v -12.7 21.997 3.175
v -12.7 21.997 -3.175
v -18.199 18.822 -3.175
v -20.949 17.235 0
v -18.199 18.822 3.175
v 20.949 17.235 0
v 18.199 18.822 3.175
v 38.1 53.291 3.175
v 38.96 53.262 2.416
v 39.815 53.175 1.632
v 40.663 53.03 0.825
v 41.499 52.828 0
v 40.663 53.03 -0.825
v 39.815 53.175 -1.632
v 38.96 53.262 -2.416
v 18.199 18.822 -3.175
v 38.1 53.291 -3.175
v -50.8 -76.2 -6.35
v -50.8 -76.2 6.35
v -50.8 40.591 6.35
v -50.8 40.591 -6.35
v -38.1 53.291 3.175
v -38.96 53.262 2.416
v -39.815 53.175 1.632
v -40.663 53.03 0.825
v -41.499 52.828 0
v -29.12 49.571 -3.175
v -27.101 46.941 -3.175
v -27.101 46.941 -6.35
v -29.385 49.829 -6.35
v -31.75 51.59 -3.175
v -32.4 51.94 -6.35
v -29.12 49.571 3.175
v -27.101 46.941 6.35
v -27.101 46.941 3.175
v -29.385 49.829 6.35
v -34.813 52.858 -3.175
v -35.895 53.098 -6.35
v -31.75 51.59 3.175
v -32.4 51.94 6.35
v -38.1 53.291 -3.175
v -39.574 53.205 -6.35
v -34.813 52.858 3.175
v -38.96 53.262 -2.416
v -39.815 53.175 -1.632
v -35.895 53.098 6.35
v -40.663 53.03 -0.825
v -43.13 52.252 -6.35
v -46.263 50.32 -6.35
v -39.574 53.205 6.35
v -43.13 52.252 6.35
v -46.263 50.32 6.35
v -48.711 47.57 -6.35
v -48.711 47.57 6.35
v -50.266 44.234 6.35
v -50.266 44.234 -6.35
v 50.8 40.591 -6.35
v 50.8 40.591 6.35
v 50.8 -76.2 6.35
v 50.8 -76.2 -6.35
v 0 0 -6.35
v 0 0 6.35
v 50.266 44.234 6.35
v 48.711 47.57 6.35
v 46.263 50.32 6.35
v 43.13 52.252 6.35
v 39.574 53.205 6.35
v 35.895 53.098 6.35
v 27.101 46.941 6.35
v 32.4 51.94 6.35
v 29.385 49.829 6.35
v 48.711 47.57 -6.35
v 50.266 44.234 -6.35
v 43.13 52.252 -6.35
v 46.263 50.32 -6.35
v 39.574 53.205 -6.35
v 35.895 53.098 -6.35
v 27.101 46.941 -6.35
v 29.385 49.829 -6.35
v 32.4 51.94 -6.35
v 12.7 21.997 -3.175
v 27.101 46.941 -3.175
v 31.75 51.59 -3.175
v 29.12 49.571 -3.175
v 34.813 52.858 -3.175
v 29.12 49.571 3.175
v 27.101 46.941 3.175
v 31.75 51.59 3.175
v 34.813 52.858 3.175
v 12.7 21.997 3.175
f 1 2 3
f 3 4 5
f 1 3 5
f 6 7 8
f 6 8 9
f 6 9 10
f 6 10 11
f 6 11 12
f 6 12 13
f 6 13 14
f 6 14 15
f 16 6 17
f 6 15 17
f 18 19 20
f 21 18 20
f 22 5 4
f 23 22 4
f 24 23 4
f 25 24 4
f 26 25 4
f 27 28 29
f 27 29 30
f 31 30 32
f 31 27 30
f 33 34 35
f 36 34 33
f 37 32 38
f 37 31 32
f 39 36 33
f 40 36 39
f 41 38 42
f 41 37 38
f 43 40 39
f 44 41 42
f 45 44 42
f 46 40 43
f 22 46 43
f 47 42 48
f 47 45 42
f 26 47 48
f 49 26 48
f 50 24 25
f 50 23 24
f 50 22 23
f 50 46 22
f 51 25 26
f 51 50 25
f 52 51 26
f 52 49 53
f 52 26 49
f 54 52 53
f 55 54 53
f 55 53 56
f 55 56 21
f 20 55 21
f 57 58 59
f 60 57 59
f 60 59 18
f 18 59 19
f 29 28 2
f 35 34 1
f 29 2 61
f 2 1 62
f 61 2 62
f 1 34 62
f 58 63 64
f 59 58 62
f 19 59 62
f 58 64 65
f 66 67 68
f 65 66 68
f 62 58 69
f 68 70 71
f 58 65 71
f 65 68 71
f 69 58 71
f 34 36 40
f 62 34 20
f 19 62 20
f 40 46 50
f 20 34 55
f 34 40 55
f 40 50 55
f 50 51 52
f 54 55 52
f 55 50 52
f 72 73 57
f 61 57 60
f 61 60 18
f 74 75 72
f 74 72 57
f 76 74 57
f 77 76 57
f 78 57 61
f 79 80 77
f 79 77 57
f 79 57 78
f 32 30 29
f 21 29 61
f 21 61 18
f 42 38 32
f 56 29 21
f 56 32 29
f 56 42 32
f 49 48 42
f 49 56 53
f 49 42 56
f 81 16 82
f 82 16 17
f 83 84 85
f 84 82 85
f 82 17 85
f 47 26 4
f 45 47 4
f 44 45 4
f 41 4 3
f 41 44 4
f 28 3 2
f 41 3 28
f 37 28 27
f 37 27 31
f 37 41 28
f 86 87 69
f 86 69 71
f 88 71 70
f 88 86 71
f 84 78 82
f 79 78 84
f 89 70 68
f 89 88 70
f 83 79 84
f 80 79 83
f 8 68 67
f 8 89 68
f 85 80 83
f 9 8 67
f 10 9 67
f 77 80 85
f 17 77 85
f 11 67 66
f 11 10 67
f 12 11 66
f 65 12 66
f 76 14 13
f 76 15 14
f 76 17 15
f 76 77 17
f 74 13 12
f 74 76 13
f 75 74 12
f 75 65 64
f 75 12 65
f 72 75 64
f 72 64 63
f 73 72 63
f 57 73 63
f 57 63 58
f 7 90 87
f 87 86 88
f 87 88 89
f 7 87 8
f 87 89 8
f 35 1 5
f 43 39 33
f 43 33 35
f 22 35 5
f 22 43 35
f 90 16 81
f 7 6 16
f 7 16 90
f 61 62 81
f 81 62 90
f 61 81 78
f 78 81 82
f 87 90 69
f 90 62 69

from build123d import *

# Parameters (mm, degrees)
BOSS_EXTRUDE1_DEPTH = 6.35
CUT_EXTRUDE1_DEPTH  = 76.2
FILLET1_R           = 12.700000000000001


with BuildPart() as part:
    # Sketch1 → Boss-Extrude1 (new, symmetric)
    with BuildSketch(Plane.XY):
        Polygon((-50.8, 87.98818102450007), (0, 0), (50.79999999999998, 87.98818102450008), (50.800000000000004, -76.19999999999999), (-50.79999999999999, -76.20000000000002), align=None)
    extrude(amount=BOSS_EXTRUDE1_DEPTH, both=True)

    # Sketch2 → Cut-Extrude1 (cut)
    with BuildSketch(Plane(origin=(-50.80000000000058, 87.98818102449974, 0), x_dir=(0, 0, -1), z_dir=(-0.500000000000001, 0.866025403784438, 0))):
        Polygon((3.175000000000003, 0), (-3.1749999999999967, 0), (-3.1749999999999967, 6.35), (3.65e-15, 9.524999999999999), (3.1749999999999994, 6.35), align=None)
    cut_extrude1 = extrude(amount=-CUT_EXTRUDE1_DEPTH, mode=Mode.SUBTRACT)

    # Mirror5: Cut-Extrude1 across plane
    add(cut_extrude1.mirror(Plane(origin=(0, 0, 0), x_dir=(0, 0, 1), z_dir=(1, 0, 0))), mode=Mode.SUBTRACT)

    # Fillet1
    fillet1_edges = [part.edges().sort_by_distance(p)[0] for p in [
        (50.79999999999998, 87.98818102450008, 4.762499999999998),
        (-50.8, 87.98818102450007, -4.762500000000001),
    ]]
    fillet(fillet1_edges, radius=FILLET1_R)


solid = part.part
